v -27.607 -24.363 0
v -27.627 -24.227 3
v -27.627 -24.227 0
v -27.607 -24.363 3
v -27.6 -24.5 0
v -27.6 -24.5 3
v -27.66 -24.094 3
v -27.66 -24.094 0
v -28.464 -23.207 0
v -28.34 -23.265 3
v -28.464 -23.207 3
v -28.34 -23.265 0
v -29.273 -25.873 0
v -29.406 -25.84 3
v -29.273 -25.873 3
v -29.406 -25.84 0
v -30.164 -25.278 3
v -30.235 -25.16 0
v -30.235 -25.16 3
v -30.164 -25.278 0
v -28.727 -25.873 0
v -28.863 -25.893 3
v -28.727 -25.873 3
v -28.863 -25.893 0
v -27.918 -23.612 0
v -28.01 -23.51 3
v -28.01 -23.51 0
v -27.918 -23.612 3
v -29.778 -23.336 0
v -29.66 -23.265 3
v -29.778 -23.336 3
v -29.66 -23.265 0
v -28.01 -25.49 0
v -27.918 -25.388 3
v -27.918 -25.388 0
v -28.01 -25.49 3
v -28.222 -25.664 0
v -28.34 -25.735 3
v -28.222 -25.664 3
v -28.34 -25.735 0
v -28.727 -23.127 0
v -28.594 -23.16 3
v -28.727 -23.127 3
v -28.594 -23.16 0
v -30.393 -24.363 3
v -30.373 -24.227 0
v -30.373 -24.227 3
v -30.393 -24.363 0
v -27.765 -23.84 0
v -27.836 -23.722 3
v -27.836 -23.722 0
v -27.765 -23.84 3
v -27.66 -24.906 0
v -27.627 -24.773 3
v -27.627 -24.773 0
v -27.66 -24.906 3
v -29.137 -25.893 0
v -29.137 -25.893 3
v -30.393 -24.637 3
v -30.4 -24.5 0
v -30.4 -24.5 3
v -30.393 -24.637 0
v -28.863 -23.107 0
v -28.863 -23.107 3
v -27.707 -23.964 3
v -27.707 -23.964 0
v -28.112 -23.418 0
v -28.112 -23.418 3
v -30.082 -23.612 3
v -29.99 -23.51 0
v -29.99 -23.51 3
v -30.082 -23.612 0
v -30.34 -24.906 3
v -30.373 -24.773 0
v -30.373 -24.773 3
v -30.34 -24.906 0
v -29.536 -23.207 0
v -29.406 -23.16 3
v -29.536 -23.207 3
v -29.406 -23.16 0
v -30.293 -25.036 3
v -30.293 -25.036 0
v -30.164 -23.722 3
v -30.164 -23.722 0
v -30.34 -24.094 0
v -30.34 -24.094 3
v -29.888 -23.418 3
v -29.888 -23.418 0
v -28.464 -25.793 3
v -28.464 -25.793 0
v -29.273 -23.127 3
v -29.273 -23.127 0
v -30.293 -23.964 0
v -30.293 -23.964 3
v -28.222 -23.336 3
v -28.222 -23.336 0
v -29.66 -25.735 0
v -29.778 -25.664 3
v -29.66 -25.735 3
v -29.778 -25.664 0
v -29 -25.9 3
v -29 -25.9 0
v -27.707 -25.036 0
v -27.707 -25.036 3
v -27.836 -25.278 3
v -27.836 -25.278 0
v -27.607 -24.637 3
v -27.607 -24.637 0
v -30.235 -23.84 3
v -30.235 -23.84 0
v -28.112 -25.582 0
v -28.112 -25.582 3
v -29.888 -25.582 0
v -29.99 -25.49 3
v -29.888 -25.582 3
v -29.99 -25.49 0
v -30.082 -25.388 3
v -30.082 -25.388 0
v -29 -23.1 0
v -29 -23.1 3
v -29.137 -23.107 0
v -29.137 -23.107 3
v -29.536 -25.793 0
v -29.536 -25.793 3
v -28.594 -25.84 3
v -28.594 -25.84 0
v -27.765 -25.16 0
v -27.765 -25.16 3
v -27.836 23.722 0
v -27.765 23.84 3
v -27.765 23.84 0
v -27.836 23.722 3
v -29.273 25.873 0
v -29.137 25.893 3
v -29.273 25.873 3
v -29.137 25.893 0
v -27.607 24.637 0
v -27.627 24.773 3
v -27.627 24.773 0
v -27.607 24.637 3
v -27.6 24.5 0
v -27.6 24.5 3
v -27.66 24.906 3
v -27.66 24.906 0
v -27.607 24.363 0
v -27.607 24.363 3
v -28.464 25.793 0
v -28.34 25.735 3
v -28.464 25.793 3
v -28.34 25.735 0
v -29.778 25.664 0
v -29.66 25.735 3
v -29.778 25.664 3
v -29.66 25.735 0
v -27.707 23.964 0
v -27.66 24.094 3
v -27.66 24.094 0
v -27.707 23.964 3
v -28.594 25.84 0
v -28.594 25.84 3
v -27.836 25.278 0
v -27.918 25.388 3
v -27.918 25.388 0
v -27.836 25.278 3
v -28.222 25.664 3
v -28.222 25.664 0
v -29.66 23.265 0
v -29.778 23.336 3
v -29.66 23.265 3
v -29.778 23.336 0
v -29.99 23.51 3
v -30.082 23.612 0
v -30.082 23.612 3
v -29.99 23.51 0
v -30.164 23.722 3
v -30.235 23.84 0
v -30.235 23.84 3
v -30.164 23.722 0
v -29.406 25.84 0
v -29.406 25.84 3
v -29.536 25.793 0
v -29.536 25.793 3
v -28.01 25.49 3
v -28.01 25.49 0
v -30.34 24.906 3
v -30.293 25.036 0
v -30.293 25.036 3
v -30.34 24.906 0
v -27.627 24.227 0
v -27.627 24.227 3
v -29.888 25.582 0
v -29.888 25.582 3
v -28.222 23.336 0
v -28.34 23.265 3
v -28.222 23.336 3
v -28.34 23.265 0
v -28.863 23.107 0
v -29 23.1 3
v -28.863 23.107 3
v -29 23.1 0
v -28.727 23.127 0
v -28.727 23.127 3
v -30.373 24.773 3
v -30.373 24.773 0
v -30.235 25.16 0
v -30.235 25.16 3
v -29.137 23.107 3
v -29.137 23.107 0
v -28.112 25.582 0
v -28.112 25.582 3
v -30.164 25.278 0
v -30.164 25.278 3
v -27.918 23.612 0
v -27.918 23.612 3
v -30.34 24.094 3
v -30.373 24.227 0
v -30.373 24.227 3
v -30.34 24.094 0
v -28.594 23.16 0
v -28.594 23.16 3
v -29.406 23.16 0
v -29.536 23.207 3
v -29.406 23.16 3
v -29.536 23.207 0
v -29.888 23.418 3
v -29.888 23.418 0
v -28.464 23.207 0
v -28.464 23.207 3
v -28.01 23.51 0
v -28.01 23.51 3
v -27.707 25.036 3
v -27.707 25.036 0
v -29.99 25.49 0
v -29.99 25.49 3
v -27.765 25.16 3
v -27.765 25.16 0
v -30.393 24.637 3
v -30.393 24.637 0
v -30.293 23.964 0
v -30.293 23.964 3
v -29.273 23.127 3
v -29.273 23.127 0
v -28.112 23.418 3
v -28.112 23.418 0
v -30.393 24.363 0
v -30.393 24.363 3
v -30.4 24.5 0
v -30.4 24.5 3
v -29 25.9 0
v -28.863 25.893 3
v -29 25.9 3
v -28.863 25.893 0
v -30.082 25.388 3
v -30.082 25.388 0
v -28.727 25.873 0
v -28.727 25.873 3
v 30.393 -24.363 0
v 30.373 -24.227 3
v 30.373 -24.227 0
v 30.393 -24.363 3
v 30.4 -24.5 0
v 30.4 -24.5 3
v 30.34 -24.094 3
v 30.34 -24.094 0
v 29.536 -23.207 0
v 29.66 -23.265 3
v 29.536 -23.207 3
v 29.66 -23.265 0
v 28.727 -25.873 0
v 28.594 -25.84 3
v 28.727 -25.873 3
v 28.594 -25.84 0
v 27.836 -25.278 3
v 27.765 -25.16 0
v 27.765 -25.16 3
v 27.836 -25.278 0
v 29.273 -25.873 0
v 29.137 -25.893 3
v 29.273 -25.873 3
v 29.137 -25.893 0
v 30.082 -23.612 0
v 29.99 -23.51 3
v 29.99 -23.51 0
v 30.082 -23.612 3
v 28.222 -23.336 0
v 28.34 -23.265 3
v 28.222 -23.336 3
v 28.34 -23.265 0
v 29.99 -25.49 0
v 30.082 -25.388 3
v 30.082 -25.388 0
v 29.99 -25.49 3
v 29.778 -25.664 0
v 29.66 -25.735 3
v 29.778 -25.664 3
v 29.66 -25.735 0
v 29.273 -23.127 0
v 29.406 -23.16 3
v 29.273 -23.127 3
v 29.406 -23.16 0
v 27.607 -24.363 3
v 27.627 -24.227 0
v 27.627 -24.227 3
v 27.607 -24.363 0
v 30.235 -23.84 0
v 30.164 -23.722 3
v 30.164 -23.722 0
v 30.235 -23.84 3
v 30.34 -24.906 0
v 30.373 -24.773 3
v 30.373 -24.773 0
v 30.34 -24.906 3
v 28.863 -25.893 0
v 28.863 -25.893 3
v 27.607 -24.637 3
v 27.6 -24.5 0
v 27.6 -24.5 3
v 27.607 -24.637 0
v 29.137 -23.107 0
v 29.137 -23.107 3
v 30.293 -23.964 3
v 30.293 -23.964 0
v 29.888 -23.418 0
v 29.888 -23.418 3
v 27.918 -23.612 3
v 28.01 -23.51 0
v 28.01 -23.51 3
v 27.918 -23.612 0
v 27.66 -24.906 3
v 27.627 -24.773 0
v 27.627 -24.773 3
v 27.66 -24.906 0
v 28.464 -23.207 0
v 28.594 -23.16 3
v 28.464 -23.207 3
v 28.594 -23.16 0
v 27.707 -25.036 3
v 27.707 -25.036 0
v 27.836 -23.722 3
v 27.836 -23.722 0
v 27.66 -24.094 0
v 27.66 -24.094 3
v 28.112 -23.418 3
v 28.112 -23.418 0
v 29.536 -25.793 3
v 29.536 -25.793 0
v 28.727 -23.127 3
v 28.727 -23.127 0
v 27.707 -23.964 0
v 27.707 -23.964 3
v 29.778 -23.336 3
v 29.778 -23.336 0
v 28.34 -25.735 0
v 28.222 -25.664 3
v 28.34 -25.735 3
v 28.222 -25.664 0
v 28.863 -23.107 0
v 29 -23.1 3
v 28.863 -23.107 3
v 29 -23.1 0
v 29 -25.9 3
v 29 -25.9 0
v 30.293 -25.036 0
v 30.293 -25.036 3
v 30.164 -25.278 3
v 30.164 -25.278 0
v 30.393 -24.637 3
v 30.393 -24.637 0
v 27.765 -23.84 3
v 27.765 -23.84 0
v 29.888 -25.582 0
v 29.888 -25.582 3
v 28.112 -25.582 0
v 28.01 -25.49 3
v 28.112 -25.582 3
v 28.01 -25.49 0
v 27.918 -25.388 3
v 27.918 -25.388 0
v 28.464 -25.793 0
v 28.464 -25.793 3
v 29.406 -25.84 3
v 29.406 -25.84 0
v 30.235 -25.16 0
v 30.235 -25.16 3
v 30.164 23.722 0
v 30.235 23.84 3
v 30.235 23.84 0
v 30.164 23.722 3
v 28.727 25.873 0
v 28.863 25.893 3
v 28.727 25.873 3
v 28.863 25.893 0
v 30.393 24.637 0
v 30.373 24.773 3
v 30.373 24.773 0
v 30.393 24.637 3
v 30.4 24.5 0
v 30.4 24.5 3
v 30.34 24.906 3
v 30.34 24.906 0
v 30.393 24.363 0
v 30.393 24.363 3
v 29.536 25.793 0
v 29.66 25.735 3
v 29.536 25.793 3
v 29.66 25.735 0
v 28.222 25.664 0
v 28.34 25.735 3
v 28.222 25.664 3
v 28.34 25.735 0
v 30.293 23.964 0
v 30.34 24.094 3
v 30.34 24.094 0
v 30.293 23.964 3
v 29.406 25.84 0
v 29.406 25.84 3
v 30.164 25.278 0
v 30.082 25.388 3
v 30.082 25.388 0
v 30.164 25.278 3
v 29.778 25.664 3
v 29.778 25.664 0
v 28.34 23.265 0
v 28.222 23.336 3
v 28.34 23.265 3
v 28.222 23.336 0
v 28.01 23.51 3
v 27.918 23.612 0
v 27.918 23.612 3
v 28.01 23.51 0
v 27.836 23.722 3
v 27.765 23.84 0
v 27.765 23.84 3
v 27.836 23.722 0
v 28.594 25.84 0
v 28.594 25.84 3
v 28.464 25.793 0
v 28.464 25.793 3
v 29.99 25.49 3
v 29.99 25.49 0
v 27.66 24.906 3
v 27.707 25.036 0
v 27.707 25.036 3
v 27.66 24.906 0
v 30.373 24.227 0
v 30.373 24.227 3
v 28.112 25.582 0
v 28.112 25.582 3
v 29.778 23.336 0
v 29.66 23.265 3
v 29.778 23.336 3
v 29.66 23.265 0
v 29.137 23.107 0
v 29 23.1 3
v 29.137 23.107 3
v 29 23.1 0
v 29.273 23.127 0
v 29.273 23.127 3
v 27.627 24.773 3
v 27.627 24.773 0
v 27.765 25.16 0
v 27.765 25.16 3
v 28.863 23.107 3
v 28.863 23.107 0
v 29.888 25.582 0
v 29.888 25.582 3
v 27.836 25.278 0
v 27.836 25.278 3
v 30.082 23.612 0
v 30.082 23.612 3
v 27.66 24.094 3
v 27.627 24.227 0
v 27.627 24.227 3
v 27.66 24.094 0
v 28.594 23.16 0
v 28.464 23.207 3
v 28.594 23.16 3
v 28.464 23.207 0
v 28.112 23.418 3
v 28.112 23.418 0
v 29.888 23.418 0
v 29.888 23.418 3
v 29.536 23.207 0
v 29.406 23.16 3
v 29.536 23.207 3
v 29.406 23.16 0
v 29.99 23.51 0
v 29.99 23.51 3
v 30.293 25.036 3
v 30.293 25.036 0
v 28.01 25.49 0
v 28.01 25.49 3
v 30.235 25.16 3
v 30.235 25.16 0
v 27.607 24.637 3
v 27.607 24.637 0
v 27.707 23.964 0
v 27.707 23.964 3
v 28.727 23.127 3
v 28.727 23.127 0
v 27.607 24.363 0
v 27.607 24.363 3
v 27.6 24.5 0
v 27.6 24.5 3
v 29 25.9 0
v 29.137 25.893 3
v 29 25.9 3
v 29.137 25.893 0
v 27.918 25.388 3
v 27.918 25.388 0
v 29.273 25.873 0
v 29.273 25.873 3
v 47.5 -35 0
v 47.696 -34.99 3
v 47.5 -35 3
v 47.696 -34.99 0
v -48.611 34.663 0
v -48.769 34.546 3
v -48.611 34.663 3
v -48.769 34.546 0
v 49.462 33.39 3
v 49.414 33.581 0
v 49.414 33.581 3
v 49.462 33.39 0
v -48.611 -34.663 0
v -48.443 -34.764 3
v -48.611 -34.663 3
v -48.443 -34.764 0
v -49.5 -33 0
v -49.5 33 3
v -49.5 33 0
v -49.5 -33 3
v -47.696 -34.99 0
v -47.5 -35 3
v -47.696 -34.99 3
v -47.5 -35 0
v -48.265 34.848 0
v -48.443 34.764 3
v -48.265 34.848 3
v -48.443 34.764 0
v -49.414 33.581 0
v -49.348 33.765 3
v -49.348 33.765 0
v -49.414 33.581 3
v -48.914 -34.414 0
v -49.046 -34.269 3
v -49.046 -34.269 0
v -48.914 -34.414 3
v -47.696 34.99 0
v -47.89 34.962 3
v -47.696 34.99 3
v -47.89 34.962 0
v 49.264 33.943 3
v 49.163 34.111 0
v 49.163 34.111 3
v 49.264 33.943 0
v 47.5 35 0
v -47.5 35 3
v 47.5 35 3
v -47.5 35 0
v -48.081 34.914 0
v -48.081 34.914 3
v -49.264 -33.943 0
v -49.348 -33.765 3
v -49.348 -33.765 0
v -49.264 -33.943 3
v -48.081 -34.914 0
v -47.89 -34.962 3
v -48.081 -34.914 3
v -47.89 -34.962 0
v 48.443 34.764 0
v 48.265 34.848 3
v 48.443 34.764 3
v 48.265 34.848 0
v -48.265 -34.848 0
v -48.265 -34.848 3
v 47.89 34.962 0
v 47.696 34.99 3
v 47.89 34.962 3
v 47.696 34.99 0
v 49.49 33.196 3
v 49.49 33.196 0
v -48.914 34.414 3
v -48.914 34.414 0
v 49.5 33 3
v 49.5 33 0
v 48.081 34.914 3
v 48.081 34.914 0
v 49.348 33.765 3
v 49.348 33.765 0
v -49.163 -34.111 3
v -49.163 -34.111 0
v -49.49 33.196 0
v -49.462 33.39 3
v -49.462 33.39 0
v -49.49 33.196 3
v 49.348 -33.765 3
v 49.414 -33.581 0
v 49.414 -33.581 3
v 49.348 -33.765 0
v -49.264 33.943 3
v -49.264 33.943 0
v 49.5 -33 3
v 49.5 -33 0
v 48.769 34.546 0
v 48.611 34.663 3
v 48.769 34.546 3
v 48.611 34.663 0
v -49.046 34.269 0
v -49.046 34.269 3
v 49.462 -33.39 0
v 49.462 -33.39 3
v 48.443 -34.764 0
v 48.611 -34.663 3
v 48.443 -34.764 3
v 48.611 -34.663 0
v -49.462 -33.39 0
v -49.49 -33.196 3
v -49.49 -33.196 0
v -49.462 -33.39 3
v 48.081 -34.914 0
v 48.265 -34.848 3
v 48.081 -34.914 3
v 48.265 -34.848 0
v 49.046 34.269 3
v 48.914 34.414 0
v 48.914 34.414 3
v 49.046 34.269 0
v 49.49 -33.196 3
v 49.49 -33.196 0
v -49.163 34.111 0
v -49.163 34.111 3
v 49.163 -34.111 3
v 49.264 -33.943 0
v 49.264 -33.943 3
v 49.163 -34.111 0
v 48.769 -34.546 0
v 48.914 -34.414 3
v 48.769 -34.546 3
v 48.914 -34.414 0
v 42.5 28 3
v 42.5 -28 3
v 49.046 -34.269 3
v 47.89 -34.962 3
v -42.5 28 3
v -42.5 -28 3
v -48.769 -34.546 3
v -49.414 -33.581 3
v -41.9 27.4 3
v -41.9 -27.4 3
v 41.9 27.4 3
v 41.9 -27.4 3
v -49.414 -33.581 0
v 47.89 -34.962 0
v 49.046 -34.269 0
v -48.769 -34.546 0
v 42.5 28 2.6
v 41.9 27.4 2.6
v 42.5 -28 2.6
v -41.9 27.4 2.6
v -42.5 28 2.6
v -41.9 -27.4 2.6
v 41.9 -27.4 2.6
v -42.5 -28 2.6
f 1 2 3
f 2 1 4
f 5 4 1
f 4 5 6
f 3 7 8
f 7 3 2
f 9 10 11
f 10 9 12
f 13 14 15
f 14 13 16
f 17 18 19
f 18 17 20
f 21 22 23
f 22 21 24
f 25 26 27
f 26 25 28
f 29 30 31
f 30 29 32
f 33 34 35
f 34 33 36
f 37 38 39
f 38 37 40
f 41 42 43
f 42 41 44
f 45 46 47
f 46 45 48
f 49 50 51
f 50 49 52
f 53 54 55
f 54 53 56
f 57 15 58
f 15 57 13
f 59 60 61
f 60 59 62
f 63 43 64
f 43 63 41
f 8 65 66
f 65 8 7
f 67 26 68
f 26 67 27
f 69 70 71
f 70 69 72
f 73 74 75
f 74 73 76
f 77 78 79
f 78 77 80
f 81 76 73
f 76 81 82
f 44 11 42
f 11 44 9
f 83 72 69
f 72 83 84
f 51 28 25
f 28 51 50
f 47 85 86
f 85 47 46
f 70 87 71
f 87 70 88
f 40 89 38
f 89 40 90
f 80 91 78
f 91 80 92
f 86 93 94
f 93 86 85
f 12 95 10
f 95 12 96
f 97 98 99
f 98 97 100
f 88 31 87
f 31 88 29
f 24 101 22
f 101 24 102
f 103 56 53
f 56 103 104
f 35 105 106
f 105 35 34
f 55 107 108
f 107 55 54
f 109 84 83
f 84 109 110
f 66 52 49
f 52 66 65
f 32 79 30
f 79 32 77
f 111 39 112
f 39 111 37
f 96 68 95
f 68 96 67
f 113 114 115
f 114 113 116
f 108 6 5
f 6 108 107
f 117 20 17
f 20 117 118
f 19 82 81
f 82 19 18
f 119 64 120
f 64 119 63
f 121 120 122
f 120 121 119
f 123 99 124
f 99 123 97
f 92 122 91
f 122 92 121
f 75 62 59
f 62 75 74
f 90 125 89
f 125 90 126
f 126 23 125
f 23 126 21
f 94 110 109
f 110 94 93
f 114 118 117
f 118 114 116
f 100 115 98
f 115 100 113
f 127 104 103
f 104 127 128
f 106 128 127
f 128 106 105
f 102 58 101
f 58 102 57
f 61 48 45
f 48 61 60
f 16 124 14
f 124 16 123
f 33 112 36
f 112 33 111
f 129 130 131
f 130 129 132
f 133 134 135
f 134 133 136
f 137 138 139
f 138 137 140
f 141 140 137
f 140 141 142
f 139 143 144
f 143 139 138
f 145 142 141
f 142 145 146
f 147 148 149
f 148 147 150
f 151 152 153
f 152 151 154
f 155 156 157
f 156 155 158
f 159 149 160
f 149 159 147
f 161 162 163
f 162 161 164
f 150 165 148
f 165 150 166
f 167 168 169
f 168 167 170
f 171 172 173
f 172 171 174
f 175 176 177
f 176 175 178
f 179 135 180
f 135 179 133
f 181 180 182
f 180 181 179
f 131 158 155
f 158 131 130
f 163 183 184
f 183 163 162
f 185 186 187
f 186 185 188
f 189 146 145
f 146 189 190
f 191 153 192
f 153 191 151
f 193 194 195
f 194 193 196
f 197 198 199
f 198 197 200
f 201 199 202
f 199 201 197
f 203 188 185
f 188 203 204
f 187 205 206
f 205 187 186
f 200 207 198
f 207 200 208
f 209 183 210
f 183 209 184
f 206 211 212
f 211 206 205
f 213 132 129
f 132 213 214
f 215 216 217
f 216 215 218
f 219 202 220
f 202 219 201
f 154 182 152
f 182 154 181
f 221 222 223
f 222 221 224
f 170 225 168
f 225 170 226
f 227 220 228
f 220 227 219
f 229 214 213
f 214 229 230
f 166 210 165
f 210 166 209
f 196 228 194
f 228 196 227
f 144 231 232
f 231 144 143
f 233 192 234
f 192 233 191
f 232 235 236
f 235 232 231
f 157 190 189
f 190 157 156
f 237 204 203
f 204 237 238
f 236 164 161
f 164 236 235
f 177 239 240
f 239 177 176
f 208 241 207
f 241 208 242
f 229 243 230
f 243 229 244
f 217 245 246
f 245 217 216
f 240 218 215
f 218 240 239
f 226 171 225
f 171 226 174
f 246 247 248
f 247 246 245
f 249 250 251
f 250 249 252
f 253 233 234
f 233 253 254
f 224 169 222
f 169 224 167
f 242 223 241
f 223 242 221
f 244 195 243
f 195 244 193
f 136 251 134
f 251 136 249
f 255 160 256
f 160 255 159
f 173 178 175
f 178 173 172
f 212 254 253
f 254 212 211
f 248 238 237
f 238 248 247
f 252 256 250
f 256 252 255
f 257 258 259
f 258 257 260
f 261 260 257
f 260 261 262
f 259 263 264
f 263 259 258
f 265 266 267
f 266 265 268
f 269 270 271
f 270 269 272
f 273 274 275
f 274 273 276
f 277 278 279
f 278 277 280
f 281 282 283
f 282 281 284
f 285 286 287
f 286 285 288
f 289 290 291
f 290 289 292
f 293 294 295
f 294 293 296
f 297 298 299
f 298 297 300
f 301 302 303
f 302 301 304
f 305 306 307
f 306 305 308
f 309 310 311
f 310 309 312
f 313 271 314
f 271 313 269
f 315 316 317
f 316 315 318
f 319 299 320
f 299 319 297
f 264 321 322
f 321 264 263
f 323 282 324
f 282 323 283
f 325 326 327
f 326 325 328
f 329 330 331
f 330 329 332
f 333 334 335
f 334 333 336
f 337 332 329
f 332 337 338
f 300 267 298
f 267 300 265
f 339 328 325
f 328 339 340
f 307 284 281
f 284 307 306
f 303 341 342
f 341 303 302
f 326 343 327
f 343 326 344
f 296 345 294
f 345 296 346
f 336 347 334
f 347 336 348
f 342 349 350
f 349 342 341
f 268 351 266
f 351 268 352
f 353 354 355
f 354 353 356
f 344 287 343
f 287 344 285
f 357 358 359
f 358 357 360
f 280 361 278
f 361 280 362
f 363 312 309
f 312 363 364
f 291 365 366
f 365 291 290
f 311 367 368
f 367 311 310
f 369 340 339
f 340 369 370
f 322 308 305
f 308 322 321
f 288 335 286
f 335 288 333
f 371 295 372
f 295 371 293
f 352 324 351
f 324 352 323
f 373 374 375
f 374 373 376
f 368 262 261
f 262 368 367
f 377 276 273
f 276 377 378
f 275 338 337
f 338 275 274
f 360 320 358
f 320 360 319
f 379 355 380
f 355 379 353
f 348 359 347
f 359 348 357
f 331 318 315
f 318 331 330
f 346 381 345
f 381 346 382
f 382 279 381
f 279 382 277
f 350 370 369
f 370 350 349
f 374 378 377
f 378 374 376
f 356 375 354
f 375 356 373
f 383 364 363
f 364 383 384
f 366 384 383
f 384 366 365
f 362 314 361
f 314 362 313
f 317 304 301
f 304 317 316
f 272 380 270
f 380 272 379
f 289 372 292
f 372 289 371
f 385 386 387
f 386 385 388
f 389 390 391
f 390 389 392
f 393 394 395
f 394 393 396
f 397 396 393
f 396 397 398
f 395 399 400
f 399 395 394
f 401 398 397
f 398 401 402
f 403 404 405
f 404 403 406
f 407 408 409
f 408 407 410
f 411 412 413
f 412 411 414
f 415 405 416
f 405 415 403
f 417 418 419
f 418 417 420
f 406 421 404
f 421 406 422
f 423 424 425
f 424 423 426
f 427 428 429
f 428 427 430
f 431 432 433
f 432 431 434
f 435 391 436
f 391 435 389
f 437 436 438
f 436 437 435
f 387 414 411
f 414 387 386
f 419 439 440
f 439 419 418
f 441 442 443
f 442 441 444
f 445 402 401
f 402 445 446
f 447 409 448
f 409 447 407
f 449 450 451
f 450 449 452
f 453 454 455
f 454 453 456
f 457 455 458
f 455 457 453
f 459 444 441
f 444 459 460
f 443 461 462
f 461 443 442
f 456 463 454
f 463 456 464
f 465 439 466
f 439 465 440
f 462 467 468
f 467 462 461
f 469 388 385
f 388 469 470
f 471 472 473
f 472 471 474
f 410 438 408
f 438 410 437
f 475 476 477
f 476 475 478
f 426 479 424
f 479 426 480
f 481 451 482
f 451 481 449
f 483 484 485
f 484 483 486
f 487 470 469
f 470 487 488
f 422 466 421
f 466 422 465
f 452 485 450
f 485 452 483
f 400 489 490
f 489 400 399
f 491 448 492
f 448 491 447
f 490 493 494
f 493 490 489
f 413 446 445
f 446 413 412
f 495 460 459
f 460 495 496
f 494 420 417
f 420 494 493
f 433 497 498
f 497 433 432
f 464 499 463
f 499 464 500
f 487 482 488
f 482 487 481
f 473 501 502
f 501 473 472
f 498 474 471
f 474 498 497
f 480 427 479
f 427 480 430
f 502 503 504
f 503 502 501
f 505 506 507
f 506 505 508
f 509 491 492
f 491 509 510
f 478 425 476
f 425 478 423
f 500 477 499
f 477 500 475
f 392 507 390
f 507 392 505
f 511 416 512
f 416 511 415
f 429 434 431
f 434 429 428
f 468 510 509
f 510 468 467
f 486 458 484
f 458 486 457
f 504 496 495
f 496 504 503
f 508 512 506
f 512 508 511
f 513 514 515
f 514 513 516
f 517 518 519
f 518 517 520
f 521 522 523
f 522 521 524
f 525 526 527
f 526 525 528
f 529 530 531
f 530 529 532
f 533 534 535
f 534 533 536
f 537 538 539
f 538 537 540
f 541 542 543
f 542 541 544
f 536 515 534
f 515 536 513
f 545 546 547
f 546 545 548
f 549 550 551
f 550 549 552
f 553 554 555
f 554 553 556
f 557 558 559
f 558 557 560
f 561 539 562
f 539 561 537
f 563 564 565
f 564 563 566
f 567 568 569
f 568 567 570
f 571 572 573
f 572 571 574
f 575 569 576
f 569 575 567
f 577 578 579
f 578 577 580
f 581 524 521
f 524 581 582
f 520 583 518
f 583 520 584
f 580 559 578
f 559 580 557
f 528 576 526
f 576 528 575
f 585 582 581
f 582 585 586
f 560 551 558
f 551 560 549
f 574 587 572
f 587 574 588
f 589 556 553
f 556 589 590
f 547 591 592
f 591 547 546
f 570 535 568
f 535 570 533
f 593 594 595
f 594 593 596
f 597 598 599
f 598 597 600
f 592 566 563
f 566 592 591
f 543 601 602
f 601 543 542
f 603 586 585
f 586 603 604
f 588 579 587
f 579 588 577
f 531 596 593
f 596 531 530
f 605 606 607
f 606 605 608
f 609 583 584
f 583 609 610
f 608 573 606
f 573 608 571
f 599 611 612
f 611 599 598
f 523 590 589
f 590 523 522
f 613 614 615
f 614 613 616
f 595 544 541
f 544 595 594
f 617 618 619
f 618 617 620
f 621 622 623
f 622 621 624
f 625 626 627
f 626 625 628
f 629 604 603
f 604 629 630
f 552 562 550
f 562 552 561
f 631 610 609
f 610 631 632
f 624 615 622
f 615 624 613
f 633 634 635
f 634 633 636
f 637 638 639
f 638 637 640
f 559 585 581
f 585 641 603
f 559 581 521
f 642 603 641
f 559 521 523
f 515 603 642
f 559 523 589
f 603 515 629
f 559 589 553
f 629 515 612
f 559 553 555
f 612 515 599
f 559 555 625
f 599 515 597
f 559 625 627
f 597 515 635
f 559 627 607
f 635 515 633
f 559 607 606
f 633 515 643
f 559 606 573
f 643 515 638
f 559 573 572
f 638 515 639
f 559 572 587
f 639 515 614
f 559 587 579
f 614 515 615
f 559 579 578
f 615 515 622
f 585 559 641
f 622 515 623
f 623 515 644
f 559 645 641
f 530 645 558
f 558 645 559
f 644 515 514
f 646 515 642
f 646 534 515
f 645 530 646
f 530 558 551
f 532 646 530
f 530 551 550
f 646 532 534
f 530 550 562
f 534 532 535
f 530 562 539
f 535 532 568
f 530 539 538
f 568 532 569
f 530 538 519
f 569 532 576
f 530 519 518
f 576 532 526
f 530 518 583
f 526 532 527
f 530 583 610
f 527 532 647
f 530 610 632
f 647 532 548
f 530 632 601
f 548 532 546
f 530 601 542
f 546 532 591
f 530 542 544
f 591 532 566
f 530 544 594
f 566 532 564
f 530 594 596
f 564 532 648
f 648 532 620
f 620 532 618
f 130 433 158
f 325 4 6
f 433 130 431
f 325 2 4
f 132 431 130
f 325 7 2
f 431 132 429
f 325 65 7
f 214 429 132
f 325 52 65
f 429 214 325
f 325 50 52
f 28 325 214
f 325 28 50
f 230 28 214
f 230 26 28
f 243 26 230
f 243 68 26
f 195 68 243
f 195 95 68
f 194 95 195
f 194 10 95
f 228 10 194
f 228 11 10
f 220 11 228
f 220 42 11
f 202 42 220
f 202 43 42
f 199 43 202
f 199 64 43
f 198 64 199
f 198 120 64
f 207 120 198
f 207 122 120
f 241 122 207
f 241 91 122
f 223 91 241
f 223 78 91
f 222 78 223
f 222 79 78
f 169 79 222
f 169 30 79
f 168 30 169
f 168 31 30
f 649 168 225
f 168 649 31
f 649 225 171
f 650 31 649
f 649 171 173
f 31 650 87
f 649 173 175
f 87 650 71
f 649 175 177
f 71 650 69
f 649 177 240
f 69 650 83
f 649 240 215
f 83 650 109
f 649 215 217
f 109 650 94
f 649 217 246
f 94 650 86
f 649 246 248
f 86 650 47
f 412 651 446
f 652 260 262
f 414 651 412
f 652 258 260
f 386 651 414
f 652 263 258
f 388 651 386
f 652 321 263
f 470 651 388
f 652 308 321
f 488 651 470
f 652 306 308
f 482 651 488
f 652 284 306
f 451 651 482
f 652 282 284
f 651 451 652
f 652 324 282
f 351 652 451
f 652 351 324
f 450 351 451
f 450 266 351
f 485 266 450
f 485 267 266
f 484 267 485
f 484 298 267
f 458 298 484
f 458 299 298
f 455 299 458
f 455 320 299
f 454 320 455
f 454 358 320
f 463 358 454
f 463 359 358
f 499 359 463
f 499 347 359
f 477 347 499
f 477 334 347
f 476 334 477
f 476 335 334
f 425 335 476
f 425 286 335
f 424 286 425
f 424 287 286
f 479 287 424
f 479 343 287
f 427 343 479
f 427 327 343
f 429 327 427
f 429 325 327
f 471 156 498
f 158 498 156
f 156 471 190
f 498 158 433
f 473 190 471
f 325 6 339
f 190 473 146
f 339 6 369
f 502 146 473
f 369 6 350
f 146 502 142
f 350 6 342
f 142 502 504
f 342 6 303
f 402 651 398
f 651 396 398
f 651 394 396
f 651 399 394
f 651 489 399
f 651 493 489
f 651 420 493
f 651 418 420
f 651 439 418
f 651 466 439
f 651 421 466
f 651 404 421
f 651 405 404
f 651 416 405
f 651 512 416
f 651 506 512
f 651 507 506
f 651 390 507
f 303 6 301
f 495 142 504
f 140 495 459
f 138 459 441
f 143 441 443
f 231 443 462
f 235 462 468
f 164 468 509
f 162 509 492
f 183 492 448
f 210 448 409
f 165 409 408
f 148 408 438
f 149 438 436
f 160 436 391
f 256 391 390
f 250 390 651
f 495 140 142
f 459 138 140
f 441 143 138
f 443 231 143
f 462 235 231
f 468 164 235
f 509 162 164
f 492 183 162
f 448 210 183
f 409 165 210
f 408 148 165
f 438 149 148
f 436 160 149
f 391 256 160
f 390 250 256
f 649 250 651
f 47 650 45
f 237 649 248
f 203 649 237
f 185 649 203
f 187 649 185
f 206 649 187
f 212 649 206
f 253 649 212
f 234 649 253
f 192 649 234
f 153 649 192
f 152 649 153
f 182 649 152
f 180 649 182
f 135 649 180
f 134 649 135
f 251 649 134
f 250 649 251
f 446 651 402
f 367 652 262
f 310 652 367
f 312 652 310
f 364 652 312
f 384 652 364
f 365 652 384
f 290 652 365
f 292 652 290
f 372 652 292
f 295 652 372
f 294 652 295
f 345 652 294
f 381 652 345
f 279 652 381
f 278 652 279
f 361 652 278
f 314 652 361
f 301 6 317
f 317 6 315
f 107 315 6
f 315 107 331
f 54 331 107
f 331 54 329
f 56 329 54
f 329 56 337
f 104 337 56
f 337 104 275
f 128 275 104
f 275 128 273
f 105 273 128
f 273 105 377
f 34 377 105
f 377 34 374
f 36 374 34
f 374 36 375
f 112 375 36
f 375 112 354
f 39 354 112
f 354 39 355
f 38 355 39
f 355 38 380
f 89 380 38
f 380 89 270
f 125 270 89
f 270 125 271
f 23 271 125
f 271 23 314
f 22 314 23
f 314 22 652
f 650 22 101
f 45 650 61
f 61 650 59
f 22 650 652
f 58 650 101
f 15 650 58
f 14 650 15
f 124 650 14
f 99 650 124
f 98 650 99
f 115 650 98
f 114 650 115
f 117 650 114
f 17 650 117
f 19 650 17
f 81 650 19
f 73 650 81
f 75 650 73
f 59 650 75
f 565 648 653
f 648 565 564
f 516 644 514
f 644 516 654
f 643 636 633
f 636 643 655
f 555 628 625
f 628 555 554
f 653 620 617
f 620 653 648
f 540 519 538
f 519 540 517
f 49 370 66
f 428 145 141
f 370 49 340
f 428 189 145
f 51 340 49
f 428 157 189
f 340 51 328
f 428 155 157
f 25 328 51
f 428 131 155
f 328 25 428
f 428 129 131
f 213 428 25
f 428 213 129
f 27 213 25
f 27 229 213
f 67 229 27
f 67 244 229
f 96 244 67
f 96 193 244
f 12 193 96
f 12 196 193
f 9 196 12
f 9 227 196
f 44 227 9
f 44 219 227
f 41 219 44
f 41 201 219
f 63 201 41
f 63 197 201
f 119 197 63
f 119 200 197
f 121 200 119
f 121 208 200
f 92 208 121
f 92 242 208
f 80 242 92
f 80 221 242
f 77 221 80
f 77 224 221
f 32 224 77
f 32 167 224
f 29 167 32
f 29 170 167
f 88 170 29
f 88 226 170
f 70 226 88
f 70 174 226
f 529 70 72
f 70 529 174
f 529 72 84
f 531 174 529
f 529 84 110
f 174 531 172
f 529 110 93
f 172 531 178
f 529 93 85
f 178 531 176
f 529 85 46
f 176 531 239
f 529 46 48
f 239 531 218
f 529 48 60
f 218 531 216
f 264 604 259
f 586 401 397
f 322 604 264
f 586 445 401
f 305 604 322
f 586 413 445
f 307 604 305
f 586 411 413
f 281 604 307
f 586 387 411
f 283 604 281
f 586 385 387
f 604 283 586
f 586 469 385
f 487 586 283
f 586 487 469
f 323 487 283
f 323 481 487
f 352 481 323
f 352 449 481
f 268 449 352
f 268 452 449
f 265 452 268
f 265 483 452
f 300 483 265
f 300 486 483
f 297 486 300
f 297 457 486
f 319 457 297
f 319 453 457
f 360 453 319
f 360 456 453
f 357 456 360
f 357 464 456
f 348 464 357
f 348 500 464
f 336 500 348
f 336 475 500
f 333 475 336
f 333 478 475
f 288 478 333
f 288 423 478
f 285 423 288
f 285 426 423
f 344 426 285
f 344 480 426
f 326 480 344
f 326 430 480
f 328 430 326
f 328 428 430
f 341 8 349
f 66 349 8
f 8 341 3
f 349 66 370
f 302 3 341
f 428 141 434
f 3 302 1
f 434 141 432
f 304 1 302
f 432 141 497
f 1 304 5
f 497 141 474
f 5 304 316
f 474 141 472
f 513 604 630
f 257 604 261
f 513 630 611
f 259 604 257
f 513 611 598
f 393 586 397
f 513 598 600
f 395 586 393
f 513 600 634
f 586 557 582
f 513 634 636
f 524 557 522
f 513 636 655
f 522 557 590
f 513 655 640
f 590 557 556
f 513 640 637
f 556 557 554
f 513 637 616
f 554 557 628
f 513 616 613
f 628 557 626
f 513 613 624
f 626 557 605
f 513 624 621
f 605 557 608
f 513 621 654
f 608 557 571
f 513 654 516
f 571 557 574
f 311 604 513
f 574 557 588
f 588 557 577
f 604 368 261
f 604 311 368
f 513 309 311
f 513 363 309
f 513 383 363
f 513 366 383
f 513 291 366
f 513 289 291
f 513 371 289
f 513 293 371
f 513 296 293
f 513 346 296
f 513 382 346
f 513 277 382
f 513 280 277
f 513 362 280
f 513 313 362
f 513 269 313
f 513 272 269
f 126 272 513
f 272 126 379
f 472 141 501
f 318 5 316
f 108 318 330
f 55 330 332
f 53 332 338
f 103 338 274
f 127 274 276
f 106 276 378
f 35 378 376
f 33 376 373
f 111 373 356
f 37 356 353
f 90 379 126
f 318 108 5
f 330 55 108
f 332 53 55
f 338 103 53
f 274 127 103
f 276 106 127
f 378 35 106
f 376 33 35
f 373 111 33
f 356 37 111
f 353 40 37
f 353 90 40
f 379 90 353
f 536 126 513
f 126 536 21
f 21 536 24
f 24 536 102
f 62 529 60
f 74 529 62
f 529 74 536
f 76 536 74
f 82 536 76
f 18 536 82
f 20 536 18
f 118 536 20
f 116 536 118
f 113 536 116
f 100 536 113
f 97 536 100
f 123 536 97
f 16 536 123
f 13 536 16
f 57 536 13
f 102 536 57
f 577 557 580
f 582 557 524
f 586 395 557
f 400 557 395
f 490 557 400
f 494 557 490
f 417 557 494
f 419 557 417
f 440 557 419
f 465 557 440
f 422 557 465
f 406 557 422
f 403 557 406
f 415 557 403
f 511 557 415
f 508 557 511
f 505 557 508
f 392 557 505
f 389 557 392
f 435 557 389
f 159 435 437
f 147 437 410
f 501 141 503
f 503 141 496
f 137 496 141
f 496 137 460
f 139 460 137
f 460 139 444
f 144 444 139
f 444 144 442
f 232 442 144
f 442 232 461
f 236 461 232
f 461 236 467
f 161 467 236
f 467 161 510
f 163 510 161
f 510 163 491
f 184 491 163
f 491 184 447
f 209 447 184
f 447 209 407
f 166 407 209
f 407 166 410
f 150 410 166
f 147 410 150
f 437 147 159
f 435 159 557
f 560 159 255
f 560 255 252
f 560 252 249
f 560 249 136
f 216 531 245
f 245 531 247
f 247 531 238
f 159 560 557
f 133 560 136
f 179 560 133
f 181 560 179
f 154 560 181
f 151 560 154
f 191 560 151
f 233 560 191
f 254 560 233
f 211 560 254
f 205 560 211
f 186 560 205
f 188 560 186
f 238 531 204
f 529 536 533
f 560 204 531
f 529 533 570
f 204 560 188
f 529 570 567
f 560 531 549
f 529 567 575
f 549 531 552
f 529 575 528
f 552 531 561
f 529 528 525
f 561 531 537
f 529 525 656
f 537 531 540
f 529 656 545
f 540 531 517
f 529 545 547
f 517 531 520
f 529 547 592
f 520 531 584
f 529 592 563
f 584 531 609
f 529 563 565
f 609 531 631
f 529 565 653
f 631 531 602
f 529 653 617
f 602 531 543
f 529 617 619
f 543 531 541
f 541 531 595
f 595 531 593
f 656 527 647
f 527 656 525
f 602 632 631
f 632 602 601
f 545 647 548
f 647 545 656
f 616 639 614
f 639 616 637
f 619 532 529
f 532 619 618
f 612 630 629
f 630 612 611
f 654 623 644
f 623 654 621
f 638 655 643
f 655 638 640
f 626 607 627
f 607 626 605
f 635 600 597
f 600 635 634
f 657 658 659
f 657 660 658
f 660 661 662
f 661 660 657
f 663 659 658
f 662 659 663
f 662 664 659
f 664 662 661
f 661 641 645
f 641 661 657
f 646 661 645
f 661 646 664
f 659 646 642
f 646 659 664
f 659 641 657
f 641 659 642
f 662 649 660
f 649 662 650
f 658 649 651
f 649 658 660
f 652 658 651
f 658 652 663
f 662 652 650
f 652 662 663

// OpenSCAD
// test_fit.scad
//
// PRINT THIS FIRST before committing to the full case.
//
// This is a small plate with the four M2.5 mounting holes positioned where
// they SHOULD be for a Raspberry Pi 5. If your Pi seats correctly with
// 4x M2.5 screws through these holes, the full case (case.scad) will fit.
// If the holes are off, adjust the parameters in case.scad to match what
// works here.
//
// Print at 0.2mm layer height, 20% infill, takes ~10 minutes.
//
// VERIFIED PARAMETERS:
// - Pi 5 board: 85mm x 56mm (same as Pi 4 board outline)
// - Pi 5 mounting holes: M2.5, 58mm x 49mm spacing, 3.5mm from board edges
//
// These match the published Raspberry Pi 5 mechanical drawing. Source:
// https://datasheets.raspberrypi.com/rpi5/raspberry-pi-5-mechanical-drawing.pdf

$fn = 64;

// Pi 5 standoff hole pattern
pi_board_x = 85.0;
pi_board_y = 56.0;
pi_hole_spacing_x = 58.0;   // distance between hole pairs along long axis
pi_hole_spacing_y = 49.0;   // distance between hole pairs along short axis
pi_hole_inset = 3.5;        // distance from board edge to hole center

m2_5_clearance_dia = 2.8;   // M2.5 screw clearance hole

// Test piece
plate_thickness = 3.0;
plate_margin = 5.0;     // border around Pi board outline

module test_plate() {
    difference() {
        // Base plate matching Pi board outline plus margin
        linear_extrude(plate_thickness)
            offset(r = 2)
                square([pi_board_x + plate_margin*2,
                        pi_board_y + plate_margin*2],
                       center = true);

        // Hole pattern — same logic the full case uses
        translate([0, 0, -0.1])
            for (x = [-pi_hole_spacing_x/2, pi_hole_spacing_x/2])
                for (y = [-pi_hole_spacing_y/2, pi_hole_spacing_y/2])
                    translate([x, y, 0])
                        cylinder(d = m2_5_clearance_dia,
                                 h = plate_thickness + 0.2);

        // Pi outline scribed on top for visual confirmation
        // (a 0.4mm-deep rectangle showing where the board sits)
        translate([0, 0, plate_thickness - 0.4])
            linear_extrude(0.5)
                difference() {
                    square([pi_board_x, pi_board_y], center = true);
                    square([pi_board_x - 1.2, pi_board_y - 1.2], center = true);
                }
    }
}

test_plate();
